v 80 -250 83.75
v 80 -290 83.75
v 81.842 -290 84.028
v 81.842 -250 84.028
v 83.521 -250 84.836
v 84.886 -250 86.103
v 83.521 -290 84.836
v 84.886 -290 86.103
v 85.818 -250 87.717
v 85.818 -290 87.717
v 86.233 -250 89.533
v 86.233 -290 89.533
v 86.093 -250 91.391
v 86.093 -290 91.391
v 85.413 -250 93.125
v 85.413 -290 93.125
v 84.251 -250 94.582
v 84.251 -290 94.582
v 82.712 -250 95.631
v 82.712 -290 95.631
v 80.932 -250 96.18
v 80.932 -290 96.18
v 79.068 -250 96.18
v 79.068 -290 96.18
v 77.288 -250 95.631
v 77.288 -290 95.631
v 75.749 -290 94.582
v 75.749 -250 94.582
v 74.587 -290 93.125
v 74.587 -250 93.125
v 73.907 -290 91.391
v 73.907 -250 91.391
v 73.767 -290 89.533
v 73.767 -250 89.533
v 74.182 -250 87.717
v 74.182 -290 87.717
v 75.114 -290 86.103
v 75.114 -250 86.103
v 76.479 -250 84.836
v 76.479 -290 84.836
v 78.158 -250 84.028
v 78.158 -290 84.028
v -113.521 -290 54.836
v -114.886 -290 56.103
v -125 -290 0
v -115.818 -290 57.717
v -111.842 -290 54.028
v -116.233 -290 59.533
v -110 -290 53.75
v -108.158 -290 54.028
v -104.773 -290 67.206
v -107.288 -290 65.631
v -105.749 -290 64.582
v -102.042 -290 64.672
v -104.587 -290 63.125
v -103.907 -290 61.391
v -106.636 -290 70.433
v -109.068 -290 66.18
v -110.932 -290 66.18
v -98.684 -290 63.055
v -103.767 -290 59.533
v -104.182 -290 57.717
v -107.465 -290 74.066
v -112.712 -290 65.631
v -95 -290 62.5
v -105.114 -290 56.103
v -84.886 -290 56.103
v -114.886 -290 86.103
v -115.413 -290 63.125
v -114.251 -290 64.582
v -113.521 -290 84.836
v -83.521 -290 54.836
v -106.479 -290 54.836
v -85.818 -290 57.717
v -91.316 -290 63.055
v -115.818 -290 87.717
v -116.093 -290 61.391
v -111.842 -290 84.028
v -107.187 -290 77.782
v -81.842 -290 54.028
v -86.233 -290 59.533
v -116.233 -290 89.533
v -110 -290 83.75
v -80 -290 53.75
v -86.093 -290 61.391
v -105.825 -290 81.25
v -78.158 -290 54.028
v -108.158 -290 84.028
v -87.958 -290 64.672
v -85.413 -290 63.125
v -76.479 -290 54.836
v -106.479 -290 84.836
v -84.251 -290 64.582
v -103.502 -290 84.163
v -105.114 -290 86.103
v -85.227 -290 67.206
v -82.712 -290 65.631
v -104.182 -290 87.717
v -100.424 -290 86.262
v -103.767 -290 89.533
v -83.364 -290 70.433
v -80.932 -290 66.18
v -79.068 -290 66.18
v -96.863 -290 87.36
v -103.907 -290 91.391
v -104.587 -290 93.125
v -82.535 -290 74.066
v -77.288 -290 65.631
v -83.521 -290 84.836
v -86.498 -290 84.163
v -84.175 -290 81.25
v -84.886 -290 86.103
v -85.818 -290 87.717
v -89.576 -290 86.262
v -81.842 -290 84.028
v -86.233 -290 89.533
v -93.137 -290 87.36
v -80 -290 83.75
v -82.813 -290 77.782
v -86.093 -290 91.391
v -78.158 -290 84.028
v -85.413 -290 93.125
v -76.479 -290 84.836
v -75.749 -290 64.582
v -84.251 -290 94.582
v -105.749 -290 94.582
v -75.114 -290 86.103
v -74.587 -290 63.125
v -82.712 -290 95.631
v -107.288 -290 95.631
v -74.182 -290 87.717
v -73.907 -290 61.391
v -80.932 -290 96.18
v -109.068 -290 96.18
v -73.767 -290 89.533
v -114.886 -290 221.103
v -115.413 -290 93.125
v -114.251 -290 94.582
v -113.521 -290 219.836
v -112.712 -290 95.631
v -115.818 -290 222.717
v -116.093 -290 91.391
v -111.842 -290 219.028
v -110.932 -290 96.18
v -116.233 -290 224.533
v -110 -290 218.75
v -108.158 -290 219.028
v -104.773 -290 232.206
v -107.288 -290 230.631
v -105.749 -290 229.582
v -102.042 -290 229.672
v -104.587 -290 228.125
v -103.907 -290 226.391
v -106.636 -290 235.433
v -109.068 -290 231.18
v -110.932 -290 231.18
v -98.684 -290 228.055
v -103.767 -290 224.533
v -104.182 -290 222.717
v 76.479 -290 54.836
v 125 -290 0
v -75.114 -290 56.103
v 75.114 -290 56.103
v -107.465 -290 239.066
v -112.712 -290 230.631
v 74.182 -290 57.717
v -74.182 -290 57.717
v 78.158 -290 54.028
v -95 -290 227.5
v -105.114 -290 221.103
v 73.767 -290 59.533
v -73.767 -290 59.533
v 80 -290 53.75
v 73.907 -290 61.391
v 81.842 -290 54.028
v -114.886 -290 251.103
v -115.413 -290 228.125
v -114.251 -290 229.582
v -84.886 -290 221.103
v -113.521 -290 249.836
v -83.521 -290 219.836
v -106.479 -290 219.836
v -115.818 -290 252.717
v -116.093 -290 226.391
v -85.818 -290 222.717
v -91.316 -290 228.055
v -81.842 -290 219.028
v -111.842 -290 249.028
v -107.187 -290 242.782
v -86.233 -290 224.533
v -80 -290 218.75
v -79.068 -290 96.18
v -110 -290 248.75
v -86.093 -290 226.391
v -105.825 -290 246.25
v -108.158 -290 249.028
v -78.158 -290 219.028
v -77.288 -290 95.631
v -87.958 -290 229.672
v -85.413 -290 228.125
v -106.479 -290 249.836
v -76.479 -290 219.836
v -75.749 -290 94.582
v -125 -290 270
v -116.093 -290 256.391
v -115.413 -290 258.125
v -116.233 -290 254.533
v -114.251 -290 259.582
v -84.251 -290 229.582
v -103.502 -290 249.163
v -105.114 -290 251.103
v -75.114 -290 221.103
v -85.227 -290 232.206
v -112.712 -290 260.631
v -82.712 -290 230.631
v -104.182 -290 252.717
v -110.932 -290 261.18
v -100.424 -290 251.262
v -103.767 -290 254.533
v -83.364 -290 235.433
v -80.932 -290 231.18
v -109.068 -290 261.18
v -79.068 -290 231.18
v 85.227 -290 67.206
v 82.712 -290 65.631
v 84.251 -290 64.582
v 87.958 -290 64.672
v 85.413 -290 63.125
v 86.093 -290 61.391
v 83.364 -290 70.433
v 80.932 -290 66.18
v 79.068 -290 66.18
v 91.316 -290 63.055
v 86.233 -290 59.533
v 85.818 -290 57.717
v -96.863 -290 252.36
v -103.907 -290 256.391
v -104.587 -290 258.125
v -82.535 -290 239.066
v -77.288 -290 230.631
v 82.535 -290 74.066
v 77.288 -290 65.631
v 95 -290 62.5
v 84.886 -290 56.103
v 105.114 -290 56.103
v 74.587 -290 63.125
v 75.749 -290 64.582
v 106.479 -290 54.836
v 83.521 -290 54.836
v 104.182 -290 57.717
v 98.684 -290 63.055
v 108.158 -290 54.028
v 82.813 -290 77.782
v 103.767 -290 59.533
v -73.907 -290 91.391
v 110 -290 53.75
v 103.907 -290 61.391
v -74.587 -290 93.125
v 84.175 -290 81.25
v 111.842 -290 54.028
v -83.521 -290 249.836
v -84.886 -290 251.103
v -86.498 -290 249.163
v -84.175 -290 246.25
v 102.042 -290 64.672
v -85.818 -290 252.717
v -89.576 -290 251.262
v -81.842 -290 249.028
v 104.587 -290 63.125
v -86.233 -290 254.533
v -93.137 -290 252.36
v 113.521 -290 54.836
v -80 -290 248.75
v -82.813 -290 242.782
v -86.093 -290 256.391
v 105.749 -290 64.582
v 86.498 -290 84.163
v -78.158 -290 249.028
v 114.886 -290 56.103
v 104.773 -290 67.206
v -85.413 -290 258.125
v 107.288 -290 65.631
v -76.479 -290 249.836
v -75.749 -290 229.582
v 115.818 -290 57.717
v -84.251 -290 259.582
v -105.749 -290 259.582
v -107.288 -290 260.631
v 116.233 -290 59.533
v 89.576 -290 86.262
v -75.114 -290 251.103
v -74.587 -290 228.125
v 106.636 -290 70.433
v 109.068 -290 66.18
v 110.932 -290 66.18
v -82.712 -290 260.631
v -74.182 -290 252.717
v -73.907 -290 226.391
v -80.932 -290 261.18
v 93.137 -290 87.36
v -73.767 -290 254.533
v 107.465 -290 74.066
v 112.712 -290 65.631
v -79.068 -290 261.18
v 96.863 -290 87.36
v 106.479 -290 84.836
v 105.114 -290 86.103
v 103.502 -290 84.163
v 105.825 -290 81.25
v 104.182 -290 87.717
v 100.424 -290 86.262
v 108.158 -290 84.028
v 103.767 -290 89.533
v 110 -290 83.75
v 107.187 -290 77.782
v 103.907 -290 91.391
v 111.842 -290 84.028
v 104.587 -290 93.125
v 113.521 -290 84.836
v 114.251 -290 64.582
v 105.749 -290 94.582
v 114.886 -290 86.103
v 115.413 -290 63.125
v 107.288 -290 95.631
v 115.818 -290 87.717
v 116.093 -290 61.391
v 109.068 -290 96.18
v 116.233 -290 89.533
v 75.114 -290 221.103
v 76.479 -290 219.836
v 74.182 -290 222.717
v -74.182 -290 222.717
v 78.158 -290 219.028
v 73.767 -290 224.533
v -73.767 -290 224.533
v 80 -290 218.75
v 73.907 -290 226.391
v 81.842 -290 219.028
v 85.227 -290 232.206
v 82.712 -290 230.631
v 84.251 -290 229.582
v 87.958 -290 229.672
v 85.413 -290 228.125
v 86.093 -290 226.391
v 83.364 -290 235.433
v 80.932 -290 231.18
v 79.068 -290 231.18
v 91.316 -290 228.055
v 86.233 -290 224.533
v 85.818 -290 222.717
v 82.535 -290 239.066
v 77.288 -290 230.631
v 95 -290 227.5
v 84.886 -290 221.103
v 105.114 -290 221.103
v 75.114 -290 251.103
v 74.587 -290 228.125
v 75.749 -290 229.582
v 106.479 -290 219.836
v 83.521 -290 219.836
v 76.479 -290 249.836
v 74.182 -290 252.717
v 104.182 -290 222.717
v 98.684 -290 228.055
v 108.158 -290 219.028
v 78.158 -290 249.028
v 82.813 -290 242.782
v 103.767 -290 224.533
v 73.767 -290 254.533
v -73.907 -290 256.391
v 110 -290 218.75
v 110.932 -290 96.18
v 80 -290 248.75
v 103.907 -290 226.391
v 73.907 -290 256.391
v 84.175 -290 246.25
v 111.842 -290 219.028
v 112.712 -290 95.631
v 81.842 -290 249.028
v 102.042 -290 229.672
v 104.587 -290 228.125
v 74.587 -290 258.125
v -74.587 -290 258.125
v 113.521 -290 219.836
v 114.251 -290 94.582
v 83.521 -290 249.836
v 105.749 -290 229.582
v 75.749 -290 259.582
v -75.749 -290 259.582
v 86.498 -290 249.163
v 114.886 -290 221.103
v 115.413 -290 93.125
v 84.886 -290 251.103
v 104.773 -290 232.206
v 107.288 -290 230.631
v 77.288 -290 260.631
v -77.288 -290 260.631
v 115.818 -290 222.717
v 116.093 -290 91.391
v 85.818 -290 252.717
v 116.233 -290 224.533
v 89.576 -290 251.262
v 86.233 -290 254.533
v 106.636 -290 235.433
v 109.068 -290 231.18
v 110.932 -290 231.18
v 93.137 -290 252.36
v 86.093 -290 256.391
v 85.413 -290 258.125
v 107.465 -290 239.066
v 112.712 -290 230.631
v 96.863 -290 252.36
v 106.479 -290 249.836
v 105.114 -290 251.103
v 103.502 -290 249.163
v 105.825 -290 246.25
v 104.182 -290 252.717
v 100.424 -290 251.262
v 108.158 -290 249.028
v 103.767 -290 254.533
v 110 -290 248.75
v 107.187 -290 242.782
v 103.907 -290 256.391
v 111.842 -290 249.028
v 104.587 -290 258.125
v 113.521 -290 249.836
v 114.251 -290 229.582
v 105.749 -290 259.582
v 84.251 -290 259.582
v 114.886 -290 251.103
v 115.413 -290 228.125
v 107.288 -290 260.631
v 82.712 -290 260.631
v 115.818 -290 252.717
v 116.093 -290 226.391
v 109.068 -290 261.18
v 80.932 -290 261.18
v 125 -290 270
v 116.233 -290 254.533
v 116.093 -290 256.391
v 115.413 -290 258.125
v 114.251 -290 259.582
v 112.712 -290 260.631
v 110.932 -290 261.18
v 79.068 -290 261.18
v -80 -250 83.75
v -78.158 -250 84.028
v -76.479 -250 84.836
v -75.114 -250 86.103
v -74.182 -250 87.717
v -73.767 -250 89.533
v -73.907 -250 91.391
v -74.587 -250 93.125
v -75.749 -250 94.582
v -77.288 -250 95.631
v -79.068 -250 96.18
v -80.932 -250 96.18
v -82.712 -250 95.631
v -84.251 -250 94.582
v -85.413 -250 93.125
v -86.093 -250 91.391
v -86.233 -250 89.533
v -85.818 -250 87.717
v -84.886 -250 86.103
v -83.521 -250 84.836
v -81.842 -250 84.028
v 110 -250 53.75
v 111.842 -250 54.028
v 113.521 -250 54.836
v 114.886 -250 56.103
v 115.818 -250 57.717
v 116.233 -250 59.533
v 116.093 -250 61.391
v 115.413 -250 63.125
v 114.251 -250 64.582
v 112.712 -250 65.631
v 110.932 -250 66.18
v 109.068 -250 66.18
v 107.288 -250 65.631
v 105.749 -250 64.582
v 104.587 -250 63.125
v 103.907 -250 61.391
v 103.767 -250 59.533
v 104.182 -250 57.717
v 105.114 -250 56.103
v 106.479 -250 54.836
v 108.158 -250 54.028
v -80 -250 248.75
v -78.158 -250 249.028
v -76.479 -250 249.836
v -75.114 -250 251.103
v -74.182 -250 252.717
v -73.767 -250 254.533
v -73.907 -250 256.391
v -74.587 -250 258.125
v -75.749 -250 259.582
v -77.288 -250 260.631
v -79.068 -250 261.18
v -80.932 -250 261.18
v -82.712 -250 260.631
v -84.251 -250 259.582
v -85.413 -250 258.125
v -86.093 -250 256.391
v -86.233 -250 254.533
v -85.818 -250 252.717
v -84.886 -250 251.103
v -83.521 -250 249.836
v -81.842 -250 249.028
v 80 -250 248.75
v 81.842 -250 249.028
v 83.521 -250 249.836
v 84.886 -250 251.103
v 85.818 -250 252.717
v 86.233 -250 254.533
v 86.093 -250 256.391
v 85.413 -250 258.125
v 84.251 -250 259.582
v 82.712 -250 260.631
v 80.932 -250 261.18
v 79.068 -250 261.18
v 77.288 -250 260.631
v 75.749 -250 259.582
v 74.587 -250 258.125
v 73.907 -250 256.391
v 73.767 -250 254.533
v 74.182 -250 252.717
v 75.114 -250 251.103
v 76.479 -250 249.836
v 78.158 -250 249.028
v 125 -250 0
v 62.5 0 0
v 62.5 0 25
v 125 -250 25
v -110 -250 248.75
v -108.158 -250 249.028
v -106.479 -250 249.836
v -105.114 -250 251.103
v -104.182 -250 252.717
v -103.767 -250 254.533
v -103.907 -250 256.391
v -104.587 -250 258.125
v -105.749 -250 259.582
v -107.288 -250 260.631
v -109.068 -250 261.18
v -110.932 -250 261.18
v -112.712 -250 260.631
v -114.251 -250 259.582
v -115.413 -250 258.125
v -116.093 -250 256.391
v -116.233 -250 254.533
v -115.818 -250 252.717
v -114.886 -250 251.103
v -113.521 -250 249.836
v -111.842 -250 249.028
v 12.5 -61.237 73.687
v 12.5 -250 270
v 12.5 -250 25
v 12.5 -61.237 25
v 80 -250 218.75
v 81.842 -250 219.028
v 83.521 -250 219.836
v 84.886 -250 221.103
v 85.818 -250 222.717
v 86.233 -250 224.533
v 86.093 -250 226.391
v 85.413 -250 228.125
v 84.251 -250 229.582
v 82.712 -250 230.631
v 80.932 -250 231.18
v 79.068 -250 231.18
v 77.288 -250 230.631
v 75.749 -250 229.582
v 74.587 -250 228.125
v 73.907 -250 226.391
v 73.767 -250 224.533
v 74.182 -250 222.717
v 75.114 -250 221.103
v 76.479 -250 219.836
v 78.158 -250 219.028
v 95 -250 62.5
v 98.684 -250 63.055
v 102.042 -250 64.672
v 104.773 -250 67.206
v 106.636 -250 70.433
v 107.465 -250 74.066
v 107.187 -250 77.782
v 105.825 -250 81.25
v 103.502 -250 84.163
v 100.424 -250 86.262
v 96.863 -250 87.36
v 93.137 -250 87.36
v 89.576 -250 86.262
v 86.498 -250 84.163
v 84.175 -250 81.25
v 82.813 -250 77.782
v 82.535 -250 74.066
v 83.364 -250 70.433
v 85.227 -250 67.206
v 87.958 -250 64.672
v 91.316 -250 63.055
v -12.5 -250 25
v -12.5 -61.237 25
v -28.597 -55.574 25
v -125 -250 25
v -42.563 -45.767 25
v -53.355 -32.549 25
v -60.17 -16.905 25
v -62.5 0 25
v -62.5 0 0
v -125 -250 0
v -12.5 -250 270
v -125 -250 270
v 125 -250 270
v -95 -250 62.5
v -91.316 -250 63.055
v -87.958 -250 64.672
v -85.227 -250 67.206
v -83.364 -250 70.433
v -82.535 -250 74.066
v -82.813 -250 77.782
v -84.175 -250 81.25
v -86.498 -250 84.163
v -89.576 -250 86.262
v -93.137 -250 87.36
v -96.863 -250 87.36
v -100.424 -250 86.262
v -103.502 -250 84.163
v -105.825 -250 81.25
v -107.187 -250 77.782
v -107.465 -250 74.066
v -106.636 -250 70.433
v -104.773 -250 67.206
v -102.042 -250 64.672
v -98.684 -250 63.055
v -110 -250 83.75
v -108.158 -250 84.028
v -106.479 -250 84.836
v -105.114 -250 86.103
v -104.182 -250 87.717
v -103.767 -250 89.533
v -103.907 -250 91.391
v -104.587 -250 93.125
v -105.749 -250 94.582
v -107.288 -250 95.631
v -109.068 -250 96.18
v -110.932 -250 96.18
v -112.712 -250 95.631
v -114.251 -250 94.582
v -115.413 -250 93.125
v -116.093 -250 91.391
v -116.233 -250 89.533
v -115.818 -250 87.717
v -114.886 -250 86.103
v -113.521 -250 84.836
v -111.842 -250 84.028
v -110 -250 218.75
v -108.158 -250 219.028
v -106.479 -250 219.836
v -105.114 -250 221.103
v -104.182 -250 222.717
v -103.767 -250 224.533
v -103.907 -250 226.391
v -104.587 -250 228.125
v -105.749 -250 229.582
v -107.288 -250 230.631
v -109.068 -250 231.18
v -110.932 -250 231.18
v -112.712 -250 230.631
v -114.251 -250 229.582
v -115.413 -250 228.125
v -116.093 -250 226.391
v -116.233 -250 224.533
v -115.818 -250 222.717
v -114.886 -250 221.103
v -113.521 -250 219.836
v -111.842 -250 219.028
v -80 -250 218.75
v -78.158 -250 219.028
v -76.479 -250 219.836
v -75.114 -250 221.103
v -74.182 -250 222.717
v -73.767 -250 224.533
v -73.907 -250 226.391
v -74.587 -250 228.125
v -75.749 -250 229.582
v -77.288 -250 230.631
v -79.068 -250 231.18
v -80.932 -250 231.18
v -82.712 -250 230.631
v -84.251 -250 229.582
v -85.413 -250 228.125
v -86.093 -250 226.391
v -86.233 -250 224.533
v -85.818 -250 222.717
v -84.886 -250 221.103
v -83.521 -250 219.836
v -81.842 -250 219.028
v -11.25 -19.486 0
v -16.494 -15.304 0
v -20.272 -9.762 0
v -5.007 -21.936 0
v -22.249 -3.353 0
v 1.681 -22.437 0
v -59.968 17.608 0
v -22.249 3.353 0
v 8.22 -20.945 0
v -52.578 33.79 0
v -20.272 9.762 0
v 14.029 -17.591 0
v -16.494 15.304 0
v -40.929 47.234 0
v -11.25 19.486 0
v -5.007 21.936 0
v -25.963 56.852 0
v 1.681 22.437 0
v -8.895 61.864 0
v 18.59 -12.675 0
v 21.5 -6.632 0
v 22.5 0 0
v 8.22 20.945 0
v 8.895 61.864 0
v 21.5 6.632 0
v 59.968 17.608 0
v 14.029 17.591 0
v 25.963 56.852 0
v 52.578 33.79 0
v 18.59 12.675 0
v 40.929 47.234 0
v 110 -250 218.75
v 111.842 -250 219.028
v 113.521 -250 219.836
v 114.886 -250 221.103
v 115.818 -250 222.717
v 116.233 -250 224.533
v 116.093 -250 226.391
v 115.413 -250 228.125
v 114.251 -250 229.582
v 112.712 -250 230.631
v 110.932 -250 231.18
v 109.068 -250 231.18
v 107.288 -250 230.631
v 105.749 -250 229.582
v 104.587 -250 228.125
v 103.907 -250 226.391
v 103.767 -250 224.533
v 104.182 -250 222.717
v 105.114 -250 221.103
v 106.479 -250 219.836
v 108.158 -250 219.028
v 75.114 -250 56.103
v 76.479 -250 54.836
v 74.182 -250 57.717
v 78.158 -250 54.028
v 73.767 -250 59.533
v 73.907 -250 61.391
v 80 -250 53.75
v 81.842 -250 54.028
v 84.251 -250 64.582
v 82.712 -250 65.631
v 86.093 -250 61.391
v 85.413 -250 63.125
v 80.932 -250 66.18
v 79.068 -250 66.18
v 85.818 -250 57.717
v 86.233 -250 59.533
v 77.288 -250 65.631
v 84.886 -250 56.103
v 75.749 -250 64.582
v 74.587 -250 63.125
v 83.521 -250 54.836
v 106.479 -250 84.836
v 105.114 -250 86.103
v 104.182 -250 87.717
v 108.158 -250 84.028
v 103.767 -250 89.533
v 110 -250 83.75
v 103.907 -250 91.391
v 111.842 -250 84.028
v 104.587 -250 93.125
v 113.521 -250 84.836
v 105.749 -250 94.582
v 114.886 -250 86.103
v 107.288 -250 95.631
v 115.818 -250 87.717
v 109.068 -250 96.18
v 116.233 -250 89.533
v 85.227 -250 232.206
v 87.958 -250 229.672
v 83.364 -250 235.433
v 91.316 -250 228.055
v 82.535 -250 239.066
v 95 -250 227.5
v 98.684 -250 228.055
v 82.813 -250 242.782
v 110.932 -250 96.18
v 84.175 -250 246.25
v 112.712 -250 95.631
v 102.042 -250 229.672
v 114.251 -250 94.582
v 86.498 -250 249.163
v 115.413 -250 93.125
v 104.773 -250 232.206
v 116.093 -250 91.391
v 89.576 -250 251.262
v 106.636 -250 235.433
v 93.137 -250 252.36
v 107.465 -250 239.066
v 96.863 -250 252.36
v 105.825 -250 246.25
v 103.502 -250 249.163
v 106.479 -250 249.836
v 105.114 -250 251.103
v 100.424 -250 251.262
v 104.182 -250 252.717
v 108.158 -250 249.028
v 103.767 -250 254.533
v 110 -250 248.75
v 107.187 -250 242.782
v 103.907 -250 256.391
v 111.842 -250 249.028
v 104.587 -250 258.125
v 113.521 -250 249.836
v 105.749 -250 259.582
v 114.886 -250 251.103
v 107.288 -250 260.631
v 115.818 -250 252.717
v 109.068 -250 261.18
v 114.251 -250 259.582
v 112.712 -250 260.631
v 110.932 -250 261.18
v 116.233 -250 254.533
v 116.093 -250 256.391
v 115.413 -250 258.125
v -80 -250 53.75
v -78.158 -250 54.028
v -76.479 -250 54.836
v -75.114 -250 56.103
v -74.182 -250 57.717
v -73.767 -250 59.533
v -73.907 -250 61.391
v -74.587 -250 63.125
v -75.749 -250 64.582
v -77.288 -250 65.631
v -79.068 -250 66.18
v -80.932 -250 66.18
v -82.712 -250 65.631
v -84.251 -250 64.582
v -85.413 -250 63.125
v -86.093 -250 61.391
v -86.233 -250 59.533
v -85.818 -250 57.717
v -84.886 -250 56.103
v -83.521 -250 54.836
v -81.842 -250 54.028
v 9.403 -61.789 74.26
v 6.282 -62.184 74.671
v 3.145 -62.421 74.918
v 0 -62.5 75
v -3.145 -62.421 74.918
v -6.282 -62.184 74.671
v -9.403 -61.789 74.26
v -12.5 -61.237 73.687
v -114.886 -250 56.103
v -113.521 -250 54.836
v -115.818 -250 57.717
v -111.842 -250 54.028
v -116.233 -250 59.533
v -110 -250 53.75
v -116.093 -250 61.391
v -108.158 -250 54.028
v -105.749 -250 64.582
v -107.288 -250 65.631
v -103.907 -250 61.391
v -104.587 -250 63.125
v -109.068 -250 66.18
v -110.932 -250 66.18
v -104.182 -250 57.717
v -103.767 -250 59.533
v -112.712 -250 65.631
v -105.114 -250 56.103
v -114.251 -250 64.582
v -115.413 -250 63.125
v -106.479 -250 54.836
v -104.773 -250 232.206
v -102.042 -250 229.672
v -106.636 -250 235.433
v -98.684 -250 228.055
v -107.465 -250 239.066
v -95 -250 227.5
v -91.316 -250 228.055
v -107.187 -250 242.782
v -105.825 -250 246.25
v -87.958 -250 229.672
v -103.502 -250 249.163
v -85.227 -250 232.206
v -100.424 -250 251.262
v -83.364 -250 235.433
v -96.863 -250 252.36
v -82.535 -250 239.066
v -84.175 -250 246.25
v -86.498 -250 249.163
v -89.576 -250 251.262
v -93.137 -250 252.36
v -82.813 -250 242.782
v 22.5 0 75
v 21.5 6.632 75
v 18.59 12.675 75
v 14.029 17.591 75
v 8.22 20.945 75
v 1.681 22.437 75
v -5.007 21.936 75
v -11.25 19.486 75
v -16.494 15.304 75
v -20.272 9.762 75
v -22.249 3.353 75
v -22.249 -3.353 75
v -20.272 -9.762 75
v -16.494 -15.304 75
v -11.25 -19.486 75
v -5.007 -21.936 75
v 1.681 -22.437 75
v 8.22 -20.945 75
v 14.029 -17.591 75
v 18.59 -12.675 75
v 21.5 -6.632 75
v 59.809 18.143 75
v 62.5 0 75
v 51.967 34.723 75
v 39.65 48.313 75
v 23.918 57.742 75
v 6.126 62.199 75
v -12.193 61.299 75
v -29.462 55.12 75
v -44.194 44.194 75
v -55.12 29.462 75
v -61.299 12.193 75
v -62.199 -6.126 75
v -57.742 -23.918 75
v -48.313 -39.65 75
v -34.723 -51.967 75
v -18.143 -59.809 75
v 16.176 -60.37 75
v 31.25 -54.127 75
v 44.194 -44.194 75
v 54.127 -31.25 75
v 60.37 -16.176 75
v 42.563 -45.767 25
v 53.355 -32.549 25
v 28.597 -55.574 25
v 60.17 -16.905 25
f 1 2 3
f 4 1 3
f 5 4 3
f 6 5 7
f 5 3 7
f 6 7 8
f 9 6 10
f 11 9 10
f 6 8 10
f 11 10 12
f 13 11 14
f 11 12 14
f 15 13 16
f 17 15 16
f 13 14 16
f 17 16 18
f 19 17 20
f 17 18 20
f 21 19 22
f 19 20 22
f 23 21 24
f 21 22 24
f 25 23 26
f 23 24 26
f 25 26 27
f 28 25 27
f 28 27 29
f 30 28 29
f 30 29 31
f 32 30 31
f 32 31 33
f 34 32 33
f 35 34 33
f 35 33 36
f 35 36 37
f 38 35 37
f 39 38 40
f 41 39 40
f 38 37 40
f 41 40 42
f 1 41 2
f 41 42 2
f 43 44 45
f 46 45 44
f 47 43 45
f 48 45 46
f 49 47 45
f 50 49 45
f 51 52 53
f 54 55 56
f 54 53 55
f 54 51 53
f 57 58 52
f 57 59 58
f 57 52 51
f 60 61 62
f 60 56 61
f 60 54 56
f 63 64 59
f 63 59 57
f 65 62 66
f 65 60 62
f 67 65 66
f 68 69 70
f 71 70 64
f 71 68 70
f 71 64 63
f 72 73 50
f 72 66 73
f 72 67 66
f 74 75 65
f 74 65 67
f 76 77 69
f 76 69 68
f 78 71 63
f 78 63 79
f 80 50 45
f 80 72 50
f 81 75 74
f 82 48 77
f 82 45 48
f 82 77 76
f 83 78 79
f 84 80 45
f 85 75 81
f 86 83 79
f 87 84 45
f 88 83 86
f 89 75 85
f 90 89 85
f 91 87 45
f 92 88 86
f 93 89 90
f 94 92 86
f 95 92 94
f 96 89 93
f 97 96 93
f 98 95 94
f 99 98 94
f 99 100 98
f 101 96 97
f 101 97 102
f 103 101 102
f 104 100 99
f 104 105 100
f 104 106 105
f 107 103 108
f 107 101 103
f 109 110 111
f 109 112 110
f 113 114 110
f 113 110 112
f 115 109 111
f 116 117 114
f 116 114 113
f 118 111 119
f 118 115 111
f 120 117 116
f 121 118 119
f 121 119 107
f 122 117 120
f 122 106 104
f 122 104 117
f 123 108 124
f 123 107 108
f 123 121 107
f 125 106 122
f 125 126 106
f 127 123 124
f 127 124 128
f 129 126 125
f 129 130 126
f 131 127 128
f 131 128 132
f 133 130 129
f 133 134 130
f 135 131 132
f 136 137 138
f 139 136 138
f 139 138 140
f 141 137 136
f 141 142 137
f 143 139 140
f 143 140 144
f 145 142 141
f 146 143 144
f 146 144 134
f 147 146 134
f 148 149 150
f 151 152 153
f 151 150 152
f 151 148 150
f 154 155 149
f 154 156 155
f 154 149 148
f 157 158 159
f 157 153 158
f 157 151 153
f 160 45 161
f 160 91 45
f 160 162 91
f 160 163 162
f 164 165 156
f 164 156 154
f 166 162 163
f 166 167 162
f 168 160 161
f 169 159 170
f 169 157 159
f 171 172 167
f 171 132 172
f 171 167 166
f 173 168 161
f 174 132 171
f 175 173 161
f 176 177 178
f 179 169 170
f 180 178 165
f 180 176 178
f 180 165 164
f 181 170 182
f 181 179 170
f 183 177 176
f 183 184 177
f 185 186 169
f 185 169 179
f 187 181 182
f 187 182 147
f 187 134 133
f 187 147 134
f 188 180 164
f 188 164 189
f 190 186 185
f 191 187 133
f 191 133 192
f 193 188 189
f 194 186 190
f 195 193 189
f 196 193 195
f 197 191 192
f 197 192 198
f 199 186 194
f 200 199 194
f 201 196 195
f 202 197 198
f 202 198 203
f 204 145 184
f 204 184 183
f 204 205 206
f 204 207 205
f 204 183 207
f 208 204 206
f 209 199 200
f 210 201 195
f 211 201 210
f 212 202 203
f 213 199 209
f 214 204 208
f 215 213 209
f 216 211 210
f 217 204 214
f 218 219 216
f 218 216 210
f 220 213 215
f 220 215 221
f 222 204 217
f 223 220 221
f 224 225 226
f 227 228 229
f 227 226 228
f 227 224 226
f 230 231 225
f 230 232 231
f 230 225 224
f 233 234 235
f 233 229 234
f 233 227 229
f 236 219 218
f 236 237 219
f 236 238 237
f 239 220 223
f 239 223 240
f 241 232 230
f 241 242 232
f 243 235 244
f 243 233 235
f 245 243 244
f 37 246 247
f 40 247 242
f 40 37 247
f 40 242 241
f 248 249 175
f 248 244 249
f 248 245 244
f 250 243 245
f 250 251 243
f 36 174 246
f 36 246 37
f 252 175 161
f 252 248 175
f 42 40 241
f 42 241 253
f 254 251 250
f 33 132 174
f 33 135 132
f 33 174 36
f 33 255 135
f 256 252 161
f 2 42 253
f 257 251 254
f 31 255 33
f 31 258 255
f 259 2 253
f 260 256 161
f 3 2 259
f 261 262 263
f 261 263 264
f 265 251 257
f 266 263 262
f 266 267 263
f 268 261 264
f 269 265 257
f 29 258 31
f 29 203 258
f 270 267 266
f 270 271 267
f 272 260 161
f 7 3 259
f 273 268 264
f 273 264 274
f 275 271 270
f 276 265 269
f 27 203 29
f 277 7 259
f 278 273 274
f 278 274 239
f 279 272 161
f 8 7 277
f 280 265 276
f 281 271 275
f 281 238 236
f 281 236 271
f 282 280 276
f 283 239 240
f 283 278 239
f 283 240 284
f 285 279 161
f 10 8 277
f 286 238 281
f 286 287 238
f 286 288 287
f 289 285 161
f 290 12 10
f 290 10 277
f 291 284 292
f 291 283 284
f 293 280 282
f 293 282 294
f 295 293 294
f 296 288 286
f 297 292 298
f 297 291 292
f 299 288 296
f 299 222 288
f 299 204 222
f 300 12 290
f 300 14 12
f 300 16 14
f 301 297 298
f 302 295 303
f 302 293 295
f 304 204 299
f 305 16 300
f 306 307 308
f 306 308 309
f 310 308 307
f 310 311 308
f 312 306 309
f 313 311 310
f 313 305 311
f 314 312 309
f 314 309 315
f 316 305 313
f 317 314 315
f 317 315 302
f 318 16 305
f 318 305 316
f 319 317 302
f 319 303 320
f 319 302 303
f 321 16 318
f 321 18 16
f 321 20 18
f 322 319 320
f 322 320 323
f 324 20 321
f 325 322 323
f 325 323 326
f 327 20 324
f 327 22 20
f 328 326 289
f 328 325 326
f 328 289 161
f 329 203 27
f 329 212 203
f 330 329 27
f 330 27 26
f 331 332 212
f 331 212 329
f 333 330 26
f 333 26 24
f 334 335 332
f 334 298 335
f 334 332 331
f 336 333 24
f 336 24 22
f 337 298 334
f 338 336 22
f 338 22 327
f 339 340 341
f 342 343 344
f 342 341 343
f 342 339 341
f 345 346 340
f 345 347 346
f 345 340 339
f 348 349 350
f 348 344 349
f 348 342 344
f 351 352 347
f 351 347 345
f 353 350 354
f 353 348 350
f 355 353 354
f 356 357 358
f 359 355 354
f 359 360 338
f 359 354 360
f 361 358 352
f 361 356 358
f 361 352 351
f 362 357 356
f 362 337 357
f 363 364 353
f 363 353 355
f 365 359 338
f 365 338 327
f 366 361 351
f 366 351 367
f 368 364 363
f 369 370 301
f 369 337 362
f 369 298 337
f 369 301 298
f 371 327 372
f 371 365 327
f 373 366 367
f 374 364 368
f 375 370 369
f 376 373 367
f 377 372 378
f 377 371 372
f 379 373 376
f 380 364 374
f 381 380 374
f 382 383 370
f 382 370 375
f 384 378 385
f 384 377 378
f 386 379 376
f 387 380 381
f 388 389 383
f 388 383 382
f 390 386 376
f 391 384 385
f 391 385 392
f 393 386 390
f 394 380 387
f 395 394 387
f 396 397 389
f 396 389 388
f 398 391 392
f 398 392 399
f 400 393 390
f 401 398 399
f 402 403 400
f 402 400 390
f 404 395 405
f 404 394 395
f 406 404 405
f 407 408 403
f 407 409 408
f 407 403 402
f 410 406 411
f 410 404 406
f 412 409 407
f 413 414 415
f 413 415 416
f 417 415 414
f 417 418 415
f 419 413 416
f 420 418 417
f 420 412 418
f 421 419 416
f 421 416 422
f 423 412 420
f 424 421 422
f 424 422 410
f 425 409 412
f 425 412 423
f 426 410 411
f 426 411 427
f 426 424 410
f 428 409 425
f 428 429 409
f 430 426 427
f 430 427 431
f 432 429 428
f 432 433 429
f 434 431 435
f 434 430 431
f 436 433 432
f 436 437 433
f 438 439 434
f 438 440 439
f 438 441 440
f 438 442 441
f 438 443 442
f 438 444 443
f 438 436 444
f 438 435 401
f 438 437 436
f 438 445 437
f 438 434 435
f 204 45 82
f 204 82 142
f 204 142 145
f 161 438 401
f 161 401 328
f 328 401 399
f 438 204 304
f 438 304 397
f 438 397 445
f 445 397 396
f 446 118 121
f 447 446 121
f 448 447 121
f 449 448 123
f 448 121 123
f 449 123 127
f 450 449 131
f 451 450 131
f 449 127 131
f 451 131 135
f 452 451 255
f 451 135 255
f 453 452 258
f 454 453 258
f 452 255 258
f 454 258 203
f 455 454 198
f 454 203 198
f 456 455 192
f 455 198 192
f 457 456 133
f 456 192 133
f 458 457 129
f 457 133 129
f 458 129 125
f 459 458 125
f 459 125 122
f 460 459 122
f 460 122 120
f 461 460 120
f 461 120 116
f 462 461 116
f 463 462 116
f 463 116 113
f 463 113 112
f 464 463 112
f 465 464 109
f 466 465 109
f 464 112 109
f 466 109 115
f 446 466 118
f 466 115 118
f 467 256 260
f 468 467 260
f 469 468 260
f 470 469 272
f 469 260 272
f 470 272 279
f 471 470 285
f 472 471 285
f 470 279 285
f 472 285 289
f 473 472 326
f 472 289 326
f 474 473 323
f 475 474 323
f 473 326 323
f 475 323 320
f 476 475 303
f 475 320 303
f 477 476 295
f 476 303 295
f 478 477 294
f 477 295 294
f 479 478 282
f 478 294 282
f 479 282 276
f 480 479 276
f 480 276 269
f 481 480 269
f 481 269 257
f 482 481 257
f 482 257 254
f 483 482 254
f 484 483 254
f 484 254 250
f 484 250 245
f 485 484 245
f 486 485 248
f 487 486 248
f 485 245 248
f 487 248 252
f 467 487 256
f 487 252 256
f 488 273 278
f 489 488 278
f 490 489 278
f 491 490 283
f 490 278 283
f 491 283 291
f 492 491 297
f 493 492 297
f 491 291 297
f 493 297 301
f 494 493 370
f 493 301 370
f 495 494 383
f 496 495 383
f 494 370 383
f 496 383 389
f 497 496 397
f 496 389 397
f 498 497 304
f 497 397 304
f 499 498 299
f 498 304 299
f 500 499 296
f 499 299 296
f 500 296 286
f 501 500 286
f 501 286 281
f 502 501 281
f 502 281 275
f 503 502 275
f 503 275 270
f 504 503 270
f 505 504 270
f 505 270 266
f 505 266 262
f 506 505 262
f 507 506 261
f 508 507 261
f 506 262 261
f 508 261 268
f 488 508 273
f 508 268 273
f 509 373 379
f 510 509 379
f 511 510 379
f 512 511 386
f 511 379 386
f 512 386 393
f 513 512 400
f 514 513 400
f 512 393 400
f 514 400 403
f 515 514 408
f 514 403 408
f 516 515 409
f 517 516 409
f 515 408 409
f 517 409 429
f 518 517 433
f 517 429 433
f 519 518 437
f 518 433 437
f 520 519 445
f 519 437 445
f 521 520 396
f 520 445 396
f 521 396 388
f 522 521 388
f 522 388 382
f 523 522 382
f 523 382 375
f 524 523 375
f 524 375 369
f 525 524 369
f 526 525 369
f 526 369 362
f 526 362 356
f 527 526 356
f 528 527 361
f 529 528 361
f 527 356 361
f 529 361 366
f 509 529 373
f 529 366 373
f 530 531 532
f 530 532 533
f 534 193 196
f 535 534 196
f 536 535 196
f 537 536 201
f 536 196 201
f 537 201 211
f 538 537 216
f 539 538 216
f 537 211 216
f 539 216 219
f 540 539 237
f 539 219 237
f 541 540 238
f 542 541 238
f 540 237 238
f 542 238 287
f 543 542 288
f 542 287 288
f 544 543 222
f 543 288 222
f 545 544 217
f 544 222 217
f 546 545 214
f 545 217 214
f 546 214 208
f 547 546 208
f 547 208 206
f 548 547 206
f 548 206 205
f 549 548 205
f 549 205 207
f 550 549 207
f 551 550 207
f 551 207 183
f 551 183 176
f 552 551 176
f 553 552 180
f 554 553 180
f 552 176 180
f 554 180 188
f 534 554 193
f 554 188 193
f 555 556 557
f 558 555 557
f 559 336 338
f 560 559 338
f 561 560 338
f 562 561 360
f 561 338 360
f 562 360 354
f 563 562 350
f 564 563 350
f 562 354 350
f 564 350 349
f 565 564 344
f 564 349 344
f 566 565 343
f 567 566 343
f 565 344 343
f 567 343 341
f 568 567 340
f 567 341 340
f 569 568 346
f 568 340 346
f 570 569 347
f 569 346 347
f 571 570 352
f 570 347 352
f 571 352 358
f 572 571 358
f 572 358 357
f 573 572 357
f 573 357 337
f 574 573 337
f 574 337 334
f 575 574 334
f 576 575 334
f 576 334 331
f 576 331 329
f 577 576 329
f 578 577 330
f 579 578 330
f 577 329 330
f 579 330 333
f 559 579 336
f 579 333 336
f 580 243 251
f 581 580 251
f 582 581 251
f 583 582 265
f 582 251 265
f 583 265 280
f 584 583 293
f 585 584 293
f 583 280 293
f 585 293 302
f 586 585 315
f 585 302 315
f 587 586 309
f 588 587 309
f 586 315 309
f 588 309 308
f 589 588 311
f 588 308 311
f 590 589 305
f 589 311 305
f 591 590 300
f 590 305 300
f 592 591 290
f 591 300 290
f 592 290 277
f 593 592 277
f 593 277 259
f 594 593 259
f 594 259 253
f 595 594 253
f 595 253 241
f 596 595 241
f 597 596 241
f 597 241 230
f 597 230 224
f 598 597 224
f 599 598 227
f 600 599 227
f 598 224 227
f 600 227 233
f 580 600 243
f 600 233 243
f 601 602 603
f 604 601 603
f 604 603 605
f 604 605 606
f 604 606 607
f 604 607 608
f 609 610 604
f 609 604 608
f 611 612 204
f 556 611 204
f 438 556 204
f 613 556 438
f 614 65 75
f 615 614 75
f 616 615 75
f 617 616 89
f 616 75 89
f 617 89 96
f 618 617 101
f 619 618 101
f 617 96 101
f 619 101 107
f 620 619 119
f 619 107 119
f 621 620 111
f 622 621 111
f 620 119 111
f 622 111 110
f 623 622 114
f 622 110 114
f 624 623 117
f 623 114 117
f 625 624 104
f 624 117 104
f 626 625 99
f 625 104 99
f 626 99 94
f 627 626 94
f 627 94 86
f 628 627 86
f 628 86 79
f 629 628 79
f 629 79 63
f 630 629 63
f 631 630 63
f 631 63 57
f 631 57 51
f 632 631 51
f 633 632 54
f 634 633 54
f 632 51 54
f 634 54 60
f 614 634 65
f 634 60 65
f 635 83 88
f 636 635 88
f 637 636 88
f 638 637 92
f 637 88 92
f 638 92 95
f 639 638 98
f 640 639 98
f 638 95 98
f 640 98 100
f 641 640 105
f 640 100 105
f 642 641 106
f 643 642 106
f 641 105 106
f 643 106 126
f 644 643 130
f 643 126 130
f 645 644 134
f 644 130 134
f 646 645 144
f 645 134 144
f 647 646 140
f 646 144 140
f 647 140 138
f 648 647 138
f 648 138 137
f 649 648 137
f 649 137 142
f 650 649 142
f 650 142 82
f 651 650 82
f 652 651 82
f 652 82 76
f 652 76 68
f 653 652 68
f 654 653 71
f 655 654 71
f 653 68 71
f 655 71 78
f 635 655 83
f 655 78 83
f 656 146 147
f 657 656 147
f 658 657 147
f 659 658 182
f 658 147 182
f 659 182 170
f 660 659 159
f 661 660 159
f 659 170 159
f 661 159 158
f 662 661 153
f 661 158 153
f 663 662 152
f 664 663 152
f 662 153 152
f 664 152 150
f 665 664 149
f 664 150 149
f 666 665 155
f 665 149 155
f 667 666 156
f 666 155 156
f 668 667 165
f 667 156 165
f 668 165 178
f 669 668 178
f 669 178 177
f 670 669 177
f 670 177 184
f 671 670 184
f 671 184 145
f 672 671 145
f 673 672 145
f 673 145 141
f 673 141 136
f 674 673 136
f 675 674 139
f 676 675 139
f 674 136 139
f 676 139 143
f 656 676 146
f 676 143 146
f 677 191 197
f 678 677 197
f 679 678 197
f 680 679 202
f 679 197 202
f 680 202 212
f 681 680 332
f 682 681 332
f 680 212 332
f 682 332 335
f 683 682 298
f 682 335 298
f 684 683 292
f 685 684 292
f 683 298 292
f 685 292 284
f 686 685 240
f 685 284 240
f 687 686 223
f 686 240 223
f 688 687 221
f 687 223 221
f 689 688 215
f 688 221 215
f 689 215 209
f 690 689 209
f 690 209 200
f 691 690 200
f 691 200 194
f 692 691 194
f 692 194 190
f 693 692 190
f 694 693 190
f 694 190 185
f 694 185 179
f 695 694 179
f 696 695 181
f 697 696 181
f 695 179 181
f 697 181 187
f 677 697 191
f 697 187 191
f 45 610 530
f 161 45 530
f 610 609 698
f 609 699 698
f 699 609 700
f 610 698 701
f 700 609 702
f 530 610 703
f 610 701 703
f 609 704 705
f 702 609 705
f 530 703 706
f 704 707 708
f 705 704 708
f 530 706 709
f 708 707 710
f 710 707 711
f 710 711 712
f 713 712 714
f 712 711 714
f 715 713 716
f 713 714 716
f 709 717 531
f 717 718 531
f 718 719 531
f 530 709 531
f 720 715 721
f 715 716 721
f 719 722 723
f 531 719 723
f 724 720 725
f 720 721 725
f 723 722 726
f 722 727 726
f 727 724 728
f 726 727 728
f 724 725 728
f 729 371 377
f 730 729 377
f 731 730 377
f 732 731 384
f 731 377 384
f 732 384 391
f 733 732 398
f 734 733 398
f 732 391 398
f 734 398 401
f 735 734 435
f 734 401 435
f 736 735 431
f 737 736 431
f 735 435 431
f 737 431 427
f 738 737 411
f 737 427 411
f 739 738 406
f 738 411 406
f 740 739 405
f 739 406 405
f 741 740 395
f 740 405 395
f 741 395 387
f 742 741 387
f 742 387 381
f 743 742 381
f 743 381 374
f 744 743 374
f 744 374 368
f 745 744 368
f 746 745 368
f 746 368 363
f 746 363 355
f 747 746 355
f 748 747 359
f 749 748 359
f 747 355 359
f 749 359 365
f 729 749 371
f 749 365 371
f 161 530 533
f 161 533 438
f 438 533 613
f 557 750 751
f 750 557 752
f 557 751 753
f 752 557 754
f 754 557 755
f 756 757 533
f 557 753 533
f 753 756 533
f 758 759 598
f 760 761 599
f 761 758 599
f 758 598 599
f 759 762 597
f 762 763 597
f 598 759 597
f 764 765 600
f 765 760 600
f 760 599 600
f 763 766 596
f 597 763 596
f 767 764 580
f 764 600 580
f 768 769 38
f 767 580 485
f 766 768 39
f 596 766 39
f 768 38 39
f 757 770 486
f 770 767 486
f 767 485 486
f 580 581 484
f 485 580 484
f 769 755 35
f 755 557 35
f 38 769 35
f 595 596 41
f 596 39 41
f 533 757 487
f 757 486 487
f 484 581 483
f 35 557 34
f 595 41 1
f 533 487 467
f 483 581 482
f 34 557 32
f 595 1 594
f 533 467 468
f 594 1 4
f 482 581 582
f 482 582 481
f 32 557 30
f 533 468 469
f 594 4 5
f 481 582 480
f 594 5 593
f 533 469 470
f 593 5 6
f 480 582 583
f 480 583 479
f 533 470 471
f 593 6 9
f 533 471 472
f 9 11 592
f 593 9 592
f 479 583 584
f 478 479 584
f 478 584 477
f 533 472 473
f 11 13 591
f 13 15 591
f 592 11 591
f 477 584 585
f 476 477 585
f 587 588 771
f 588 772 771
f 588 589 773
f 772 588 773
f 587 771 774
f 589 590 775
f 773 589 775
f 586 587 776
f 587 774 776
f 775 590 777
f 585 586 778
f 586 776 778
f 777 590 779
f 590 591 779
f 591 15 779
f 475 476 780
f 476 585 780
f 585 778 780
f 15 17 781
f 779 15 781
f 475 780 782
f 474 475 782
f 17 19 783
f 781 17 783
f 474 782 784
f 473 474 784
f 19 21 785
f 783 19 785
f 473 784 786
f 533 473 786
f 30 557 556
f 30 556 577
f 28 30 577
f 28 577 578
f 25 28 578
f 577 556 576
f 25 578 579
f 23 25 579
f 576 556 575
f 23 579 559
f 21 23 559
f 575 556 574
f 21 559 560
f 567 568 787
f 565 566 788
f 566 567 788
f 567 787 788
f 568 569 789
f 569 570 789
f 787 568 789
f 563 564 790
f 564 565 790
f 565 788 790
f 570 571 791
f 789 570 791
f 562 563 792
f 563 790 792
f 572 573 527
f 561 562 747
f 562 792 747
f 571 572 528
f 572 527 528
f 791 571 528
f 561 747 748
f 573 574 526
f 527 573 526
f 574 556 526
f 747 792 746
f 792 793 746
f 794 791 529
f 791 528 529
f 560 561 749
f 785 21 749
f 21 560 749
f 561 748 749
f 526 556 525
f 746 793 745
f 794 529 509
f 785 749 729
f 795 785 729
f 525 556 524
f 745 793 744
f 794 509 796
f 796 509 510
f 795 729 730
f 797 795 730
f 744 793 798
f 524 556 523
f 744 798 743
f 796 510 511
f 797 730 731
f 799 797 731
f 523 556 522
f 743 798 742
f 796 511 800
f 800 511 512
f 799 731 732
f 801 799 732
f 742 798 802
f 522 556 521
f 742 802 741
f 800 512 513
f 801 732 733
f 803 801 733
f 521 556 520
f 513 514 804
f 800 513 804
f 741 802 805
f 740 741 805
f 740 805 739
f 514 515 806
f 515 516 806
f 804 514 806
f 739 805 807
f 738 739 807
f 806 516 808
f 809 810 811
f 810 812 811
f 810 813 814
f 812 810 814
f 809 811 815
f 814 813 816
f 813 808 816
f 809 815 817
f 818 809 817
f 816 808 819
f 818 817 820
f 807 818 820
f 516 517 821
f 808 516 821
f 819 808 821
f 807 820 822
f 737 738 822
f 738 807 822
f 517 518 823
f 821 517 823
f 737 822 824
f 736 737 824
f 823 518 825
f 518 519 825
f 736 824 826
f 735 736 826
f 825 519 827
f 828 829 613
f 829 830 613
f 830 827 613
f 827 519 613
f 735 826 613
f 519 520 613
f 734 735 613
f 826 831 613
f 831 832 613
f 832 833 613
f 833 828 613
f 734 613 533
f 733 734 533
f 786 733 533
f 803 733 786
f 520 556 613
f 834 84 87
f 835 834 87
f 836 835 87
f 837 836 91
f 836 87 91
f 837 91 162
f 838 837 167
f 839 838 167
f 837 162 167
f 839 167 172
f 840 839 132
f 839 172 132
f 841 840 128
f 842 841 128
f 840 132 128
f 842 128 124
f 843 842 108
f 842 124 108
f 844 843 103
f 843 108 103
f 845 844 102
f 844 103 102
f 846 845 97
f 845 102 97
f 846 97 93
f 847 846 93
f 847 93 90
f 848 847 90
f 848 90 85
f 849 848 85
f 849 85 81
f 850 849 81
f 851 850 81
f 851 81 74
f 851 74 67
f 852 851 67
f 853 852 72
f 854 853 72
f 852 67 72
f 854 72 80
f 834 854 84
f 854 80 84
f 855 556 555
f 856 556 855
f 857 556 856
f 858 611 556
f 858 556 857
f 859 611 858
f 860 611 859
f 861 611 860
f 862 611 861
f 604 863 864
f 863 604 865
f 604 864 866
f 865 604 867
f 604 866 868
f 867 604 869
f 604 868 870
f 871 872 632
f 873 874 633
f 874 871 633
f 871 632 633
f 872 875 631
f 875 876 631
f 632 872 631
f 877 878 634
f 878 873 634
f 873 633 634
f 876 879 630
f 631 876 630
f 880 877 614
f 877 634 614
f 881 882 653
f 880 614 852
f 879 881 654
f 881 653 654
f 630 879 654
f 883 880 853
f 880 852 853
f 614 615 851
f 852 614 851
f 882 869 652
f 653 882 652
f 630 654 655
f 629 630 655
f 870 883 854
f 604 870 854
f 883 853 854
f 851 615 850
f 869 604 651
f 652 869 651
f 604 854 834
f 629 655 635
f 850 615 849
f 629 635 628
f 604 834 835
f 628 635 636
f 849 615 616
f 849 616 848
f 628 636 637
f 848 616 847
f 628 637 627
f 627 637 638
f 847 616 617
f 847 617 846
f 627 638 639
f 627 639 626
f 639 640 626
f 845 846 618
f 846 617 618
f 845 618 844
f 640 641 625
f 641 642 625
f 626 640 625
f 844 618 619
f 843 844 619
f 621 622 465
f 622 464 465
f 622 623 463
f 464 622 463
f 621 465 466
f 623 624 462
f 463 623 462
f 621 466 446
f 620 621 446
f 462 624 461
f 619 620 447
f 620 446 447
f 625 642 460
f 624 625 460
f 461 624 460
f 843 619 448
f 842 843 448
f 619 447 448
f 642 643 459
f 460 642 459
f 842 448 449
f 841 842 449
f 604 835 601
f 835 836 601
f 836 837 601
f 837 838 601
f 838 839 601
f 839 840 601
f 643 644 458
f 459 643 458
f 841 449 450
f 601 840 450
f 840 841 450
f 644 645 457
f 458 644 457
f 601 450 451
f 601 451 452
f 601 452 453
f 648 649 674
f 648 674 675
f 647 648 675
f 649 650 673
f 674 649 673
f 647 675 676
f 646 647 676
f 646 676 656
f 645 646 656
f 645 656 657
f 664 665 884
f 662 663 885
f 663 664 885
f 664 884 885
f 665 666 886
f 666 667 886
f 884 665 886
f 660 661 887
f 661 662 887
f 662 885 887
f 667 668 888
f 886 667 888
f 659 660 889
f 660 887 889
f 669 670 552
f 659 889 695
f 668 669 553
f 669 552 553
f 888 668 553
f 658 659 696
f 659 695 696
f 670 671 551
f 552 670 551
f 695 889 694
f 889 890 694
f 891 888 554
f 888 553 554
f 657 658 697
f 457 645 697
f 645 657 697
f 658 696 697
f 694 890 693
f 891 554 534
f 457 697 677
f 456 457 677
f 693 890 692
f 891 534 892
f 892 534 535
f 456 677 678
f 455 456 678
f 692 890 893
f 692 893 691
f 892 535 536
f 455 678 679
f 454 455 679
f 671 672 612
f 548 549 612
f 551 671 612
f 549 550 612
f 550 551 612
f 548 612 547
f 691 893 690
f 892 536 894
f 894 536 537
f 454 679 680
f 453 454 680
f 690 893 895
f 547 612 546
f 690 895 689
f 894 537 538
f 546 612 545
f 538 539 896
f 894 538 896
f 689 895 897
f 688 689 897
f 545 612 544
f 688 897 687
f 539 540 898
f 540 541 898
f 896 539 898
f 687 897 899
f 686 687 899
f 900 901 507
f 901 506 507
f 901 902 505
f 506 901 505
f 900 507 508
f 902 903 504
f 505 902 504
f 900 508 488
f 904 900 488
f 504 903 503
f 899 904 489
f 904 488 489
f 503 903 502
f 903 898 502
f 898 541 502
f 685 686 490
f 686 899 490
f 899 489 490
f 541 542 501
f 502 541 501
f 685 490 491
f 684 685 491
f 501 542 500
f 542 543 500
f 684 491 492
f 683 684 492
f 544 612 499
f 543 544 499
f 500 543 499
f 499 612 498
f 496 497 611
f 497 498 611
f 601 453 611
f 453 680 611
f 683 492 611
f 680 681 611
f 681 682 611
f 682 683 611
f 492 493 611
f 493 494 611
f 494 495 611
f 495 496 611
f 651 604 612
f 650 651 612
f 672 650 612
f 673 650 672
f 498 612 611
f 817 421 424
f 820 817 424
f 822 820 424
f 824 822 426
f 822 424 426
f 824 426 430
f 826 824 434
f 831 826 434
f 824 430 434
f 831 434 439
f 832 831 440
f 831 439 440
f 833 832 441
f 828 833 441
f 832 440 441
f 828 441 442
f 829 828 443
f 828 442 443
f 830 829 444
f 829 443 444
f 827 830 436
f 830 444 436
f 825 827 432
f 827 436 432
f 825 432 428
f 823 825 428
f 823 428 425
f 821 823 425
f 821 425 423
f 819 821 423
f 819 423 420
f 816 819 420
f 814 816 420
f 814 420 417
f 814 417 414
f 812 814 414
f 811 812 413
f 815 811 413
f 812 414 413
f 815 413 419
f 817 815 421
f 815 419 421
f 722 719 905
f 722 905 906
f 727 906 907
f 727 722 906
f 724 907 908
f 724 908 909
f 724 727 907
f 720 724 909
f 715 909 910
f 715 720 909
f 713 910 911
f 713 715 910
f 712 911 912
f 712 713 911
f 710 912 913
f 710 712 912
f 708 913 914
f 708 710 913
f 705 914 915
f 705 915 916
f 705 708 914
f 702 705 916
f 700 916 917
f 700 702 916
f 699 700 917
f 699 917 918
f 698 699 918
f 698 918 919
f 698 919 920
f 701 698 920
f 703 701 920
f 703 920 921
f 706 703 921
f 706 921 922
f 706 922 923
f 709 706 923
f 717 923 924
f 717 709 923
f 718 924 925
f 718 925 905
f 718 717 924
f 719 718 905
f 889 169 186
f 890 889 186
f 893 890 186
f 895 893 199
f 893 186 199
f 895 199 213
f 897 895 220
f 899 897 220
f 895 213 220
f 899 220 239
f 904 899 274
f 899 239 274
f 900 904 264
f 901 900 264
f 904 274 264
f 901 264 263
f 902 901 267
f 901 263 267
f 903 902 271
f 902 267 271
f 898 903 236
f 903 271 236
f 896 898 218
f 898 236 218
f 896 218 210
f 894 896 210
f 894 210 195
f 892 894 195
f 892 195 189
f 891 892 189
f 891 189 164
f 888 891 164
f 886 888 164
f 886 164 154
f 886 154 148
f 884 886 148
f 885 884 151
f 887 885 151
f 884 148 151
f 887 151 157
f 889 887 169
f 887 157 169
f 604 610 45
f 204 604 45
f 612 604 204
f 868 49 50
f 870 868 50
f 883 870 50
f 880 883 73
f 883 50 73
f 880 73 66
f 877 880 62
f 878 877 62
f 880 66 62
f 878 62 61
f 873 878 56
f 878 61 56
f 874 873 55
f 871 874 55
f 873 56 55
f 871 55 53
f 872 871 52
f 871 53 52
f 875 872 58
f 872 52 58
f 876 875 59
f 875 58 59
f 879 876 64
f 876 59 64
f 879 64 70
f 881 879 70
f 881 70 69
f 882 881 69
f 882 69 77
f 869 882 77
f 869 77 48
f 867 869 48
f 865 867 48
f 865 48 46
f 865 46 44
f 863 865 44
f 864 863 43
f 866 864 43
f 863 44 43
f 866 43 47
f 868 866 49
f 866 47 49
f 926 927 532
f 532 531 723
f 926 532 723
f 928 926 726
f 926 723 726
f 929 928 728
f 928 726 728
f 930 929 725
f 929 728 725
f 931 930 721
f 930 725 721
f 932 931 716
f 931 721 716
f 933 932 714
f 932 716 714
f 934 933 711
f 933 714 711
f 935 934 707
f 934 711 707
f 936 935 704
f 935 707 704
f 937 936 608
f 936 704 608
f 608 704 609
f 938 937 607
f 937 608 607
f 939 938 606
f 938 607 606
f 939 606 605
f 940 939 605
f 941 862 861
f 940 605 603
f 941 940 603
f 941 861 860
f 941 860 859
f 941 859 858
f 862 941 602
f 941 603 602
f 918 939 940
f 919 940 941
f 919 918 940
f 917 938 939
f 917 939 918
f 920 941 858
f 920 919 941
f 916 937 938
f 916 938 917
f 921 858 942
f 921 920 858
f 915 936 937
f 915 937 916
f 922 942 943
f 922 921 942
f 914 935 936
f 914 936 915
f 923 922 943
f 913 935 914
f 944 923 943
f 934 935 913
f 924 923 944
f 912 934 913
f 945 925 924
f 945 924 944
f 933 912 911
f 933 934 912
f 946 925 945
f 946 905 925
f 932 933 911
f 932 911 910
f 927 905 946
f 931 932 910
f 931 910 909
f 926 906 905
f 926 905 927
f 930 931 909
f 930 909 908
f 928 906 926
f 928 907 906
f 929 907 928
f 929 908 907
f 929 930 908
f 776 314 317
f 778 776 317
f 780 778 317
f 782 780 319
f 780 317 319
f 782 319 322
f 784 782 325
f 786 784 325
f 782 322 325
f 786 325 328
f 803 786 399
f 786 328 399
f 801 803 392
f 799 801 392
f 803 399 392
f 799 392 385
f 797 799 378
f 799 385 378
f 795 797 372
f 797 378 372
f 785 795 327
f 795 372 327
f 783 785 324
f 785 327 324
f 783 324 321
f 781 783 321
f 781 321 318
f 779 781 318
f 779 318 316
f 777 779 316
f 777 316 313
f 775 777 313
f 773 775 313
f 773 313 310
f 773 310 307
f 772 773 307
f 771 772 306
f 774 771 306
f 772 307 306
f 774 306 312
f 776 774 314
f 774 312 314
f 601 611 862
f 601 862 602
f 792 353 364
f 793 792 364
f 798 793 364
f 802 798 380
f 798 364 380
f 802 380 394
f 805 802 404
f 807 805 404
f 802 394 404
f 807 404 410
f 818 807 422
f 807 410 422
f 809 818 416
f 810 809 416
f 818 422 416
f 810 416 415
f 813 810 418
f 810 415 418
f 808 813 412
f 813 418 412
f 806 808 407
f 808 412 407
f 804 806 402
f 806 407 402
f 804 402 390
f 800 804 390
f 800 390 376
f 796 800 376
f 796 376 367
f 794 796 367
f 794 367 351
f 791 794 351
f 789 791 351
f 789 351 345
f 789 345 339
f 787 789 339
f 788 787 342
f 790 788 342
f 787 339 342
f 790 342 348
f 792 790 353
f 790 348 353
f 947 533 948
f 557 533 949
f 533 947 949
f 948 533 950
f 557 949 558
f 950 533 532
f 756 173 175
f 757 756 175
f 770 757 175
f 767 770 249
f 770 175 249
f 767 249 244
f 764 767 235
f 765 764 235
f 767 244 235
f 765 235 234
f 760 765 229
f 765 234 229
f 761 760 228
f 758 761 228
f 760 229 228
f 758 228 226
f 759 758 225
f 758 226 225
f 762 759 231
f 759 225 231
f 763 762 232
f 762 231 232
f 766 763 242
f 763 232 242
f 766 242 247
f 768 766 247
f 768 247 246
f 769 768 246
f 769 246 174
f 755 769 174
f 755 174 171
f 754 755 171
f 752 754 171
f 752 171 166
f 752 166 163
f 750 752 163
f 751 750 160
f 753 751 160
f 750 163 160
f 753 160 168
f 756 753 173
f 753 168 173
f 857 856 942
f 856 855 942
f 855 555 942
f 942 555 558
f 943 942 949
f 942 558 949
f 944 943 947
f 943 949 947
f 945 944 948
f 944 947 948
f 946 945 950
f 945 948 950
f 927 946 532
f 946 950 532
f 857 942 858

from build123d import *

# Parameters (mm, degrees)
SKETCH1_R           = 62.5
SKETCH1_R_2         = 22.5
BOSS_EXTRUDE1_DEPTH = 75
BOSS_EXTRUDE2_DEPTH = 25
SKETCH4_W           = 250
SKETCH4_H           = 270
BOSS_EXTRUDE3_DEPTH = 40
RIB5_REACH          = 417.482
SKETCH6_WALL_W      = 1103.483628374
SKETCH6_WALL_H      = 25
SKETCH9_R           = 6.25
SKETCH9_R_2         = 12.5
CUT_EXTRUDE4_DEPTH  = 40


with BuildPart() as part:
    # Sketch1 → Boss-Extrude1 (new body)
    with BuildSketch(Plane.XY):
        Circle(SKETCH1_R)
        Circle(SKETCH1_R_2, mode=Mode.SUBTRACT)
    extrude(amount=BOSS_EXTRUDE1_DEPTH)

    # Sketch3 → Boss-Extrude2 (add)
    with BuildSketch(Plane(origin=(0, 0, 0), x_dir=(-1, 0, 0), z_dir=(0, 0, -1))):
        with BuildLine():
            Line((-62.5, 0), (-125, -250))
            Line((-125, -250), (125, -250))
            Line((125, -250), (62.5, 0))
            ThreePointArc((62.5, 0), (0, -62.5), (-62.5, 0))
        make_face()
    extrude(amount=-BOSS_EXTRUDE2_DEPTH)

    # Sketch4 → Boss-Extrude3 (add)
    with BuildSketch(Plane.XZ.offset(250)):
        with Locations((0, 135)):
            Rectangle(SKETCH4_W, SKETCH4_H)
    extrude(amount=BOSS_EXTRUDE3_DEPTH)

    # Sketch6 wall → Rib5 (add, up to next)
    with BuildSketch(Plane(origin=(0, -156.25, 172.5), x_dir=(0, 0.693108716252, -0.720833064902), z_dir=(0, 0.720833064902, 0.693108716252)), mode=Mode.PRIVATE) as rib5_sk1:
        Rectangle(SKETCH6_WALL_W, SKETCH6_WALL_H)
    rib5_tool1 = extrude(rib5_sk1.sketch, amount=-RIB5_REACH, mode=Mode.PRIVATE) - part.part
    add(rib5_tool1.solids().sort_by_distance((0, -156.25, 172.5))[0])

    # Sketch9 → Cut-Extrude4 (cut)
    with BuildSketch(Plane.XZ.offset(290)):
        with Locations(Location((-110, 225, 0), (0, 0, 270))):
            Circle(SKETCH9_R)
        with Locations(Location((-110, 255, 0), (0, 0, 270))):
            Circle(SKETCH9_R)
        with Locations(Location((95, 75, 0), (0, 0, 270))):
            Circle(SKETCH9_R_2)
        with Locations(Location((-95, 240, 0), (0, 0, 270))):
            Circle(SKETCH9_R_2)
        with Locations(Location((-80, 255, 0), (0, 0, 270))):
            Circle(SKETCH9_R)
        with Locations(Location((-80, 225, 0), (0, 0, 270))):
            Circle(SKETCH9_R)
        with Locations(Location((110, 225, 0), (0, 0, 270))):
            Circle(SKETCH9_R)
        with Locations(Location((95, 240, 0), (0, 0, 270))):
            Circle(SKETCH9_R_2)
        with Locations(Location((110, 255, 0), (0, 0, 270))):
            Circle(SKETCH9_R)
        with Locations(Location((80, 255, 0), (0, 0, 270))):
            Circle(SKETCH9_R)
        with Locations(Location((80, 225, 0), (0, 0, 270))):
            Circle(SKETCH9_R)
        with Locations(Location((110, 90, 0), (0, 0, 270))):
            Circle(SKETCH9_R)
        with Locations(Location((110, 60, 0), (0, 0, 270))):
            Circle(SKETCH9_R)
        with Locations(Location((80, 60, 0), (0, 0, 270))):
            Circle(SKETCH9_R)
        with Locations(Location((80, 90, 0), (0, 0, 270))):
            Circle(SKETCH9_R)
        with Locations(Location((-80, 60, 0), (0, 0, 270))):
            Circle(SKETCH9_R)
        with Locations(Location((-80, 90, 0), (0, 0, 270))):
            Circle(SKETCH9_R)
        with Locations(Location((-110, 90, 0), (0, 0, 270))):
            Circle(SKETCH9_R)
        with Locations(Location((-110, 60, 0), (0, 0, 270))):
            Circle(SKETCH9_R)
        with Locations(Location((-95, 75, 0), (0, 0, 270))):
            Circle(SKETCH9_R_2)
    extrude(amount=-CUT_EXTRUDE4_DEPTH, mode=Mode.SUBTRACT)


solid = part.part
